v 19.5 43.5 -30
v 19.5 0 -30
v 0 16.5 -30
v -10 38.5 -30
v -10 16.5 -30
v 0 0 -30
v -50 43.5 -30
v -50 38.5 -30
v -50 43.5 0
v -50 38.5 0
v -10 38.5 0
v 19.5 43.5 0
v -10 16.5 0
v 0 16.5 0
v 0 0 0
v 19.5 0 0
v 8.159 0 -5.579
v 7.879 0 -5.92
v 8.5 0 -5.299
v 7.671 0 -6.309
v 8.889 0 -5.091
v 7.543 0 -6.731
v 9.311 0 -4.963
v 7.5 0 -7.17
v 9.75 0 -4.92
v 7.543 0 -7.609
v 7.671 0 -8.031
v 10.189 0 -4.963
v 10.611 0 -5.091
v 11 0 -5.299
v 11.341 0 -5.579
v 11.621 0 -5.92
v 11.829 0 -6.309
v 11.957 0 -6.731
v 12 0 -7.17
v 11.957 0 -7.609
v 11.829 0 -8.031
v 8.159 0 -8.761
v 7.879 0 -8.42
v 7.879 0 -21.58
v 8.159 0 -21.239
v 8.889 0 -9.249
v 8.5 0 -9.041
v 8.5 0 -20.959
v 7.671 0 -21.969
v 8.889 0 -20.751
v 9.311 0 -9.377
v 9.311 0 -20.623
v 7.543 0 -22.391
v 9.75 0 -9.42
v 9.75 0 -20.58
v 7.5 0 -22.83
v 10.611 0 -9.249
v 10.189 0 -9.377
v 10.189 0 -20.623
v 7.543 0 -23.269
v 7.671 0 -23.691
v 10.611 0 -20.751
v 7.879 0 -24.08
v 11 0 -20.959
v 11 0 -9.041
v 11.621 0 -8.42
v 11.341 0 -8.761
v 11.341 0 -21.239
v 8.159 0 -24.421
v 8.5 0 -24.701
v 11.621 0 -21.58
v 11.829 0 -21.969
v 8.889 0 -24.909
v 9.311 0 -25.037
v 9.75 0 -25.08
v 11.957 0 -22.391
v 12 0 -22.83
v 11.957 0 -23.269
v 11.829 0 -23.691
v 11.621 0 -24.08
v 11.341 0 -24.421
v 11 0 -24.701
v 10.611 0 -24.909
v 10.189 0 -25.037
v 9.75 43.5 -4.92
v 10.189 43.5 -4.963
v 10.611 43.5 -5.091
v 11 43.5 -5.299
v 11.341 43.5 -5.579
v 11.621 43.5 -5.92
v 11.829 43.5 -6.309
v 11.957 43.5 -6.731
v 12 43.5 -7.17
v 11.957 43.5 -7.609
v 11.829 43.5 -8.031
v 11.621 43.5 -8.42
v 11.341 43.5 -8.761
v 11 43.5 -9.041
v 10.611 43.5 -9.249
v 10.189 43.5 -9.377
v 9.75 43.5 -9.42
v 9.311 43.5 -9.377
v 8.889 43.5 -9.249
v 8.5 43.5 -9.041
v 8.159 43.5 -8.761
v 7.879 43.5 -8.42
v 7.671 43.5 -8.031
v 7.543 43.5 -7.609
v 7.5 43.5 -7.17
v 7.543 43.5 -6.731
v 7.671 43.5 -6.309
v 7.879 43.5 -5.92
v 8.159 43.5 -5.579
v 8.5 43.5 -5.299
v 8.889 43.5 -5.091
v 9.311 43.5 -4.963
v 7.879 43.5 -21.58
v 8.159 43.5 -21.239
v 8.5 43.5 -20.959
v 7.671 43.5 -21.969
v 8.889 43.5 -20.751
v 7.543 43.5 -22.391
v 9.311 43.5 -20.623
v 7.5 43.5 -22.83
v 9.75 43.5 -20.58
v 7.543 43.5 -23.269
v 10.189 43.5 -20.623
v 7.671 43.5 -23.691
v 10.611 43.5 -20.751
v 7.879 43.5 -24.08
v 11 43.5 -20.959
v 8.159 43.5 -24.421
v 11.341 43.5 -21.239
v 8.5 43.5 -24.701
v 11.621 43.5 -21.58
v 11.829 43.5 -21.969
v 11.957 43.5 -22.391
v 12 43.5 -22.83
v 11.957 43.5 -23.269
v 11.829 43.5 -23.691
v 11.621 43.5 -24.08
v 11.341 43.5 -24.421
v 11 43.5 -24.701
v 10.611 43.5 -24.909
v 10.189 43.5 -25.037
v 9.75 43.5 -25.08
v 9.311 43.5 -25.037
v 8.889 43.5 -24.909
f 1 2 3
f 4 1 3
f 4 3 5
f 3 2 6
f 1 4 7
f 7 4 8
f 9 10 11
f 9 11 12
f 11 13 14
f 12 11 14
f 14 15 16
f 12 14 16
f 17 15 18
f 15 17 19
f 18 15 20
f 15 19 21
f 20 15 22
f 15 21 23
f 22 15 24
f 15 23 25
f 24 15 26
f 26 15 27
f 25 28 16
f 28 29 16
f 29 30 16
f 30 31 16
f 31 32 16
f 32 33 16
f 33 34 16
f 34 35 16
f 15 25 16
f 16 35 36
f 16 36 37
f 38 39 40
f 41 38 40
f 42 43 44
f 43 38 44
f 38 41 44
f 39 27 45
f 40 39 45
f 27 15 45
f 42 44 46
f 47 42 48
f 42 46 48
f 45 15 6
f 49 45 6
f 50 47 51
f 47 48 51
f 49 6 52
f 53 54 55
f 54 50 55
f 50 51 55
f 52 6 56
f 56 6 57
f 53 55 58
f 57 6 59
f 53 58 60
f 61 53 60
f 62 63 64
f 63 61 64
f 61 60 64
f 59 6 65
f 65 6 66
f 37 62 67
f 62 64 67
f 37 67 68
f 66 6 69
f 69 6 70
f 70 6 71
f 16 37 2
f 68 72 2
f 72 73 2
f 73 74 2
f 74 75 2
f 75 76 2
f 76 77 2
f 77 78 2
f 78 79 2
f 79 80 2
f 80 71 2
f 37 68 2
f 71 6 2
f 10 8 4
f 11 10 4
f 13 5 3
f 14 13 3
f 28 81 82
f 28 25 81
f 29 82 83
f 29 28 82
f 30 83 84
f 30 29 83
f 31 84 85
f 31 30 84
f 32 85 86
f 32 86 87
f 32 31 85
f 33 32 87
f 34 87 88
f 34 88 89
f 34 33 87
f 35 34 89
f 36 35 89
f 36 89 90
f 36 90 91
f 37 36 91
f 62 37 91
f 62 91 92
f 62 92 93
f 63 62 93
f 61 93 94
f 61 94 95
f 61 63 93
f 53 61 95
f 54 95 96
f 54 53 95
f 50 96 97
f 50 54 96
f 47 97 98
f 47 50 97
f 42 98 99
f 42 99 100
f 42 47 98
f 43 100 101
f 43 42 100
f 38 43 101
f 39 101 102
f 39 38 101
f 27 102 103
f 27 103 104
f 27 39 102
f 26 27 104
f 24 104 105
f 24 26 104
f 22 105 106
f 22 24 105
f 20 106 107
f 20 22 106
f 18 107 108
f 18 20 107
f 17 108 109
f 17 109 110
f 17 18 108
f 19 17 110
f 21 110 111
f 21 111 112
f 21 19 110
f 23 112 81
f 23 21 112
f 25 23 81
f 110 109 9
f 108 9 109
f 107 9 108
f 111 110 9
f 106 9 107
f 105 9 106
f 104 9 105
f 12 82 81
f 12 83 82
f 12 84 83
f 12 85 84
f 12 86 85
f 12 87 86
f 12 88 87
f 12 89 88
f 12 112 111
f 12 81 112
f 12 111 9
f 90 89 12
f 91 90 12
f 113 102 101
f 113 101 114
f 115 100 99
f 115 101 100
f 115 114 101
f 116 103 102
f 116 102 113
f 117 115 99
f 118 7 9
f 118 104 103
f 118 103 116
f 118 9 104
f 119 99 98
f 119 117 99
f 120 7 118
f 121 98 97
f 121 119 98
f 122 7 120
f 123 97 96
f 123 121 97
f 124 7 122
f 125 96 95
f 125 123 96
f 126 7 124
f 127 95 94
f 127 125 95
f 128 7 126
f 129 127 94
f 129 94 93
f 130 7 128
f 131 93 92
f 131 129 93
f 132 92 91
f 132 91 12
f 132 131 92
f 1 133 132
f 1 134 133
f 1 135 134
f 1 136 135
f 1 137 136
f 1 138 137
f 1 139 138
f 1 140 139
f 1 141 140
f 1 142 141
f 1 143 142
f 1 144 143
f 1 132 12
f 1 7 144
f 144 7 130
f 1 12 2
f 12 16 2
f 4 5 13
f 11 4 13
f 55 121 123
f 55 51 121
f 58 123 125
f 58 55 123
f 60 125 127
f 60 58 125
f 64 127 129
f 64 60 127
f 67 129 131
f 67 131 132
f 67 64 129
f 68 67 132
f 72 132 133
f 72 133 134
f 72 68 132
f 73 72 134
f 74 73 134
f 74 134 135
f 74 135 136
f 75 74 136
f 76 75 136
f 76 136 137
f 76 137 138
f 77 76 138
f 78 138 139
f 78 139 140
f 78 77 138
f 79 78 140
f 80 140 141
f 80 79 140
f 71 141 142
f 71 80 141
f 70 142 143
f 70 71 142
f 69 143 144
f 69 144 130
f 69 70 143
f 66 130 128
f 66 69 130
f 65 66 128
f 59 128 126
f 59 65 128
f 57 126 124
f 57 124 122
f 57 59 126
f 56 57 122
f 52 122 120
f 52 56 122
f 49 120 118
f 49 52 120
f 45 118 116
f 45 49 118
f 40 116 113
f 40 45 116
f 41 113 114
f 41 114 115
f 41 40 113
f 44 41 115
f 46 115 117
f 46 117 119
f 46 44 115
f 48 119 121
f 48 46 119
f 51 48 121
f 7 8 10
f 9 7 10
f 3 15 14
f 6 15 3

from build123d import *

# Parameters (mm, degrees)
SKETCH1_W           = 19.5
SKETCH1_H           = 30
SKETCH1_R           = 2.25
BOSS_EXTRUDE1_DEPTH = 16.5
SKETCH2_R           = 2.25
BOSS_EXTRUDE2_DEPTH = 22
SKETCH3_R           = 2.25
BOSS_EXTRUDE3_DEPTH = 5


with BuildPart() as part:
    # Sketch1 → Boss-Extrude1 (new body)
    with BuildSketch(Plane(origin=(0, 0, 0), x_dir=(1, 0, 0), z_dir=(0, 1, 0))):
        with Locations((9.75, 15)):
            Rectangle(SKETCH1_W, SKETCH1_H)
        with Locations(Location((9.75, 22.830092663, 0), (0, 0, 270))):
            Circle(SKETCH1_R, mode=Mode.SUBTRACT)
        with Locations(Location((9.75, 7.169907337, 0), (0, 0, 270))):
            Circle(SKETCH1_R, mode=Mode.SUBTRACT)
    extrude(amount=BOSS_EXTRUDE1_DEPTH)

    # Sketch2 → Boss-Extrude2 (add)
    with BuildSketch(Plane(origin=(0, 16.5, 0), x_dir=(1, 0, 0), z_dir=(0, 1, 0))):
        Polygon((0, 30), (-10, 30), (-10, 0), (0, 0), (19.5, 0), (19.5, 30), align=None)
        with Locations(Location((9.75, 22.830092663, 0), (0, 0, 270))):
            Circle(SKETCH2_R, mode=Mode.SUBTRACT)
        with Locations(Location((9.75, 7.169907337, 0), (0, 0, 270))):
            Circle(SKETCH2_R, mode=Mode.SUBTRACT)
    extrude(amount=BOSS_EXTRUDE2_DEPTH)

    # Sketch3 → Boss-Extrude3 (add)
    with BuildSketch(Plane(origin=(0, 38.5, 0), x_dir=(1, 0, 0), z_dir=(0, 1, 0))):
        Polygon((-10, 30), (-50, 30), (-50, 0), (-10, 0), (19.5, 0), (19.5, 30), align=None)
        with Locations(Location((9.75, 22.830092663, 0), (0, 0, 270))):
            Circle(SKETCH3_R, mode=Mode.SUBTRACT)
        with Locations(Location((9.75, 7.169907337, 0), (0, 0, 270))):
            Circle(SKETCH3_R, mode=Mode.SUBTRACT)
    extrude(amount=BOSS_EXTRUDE3_DEPTH)


solid = part.part
